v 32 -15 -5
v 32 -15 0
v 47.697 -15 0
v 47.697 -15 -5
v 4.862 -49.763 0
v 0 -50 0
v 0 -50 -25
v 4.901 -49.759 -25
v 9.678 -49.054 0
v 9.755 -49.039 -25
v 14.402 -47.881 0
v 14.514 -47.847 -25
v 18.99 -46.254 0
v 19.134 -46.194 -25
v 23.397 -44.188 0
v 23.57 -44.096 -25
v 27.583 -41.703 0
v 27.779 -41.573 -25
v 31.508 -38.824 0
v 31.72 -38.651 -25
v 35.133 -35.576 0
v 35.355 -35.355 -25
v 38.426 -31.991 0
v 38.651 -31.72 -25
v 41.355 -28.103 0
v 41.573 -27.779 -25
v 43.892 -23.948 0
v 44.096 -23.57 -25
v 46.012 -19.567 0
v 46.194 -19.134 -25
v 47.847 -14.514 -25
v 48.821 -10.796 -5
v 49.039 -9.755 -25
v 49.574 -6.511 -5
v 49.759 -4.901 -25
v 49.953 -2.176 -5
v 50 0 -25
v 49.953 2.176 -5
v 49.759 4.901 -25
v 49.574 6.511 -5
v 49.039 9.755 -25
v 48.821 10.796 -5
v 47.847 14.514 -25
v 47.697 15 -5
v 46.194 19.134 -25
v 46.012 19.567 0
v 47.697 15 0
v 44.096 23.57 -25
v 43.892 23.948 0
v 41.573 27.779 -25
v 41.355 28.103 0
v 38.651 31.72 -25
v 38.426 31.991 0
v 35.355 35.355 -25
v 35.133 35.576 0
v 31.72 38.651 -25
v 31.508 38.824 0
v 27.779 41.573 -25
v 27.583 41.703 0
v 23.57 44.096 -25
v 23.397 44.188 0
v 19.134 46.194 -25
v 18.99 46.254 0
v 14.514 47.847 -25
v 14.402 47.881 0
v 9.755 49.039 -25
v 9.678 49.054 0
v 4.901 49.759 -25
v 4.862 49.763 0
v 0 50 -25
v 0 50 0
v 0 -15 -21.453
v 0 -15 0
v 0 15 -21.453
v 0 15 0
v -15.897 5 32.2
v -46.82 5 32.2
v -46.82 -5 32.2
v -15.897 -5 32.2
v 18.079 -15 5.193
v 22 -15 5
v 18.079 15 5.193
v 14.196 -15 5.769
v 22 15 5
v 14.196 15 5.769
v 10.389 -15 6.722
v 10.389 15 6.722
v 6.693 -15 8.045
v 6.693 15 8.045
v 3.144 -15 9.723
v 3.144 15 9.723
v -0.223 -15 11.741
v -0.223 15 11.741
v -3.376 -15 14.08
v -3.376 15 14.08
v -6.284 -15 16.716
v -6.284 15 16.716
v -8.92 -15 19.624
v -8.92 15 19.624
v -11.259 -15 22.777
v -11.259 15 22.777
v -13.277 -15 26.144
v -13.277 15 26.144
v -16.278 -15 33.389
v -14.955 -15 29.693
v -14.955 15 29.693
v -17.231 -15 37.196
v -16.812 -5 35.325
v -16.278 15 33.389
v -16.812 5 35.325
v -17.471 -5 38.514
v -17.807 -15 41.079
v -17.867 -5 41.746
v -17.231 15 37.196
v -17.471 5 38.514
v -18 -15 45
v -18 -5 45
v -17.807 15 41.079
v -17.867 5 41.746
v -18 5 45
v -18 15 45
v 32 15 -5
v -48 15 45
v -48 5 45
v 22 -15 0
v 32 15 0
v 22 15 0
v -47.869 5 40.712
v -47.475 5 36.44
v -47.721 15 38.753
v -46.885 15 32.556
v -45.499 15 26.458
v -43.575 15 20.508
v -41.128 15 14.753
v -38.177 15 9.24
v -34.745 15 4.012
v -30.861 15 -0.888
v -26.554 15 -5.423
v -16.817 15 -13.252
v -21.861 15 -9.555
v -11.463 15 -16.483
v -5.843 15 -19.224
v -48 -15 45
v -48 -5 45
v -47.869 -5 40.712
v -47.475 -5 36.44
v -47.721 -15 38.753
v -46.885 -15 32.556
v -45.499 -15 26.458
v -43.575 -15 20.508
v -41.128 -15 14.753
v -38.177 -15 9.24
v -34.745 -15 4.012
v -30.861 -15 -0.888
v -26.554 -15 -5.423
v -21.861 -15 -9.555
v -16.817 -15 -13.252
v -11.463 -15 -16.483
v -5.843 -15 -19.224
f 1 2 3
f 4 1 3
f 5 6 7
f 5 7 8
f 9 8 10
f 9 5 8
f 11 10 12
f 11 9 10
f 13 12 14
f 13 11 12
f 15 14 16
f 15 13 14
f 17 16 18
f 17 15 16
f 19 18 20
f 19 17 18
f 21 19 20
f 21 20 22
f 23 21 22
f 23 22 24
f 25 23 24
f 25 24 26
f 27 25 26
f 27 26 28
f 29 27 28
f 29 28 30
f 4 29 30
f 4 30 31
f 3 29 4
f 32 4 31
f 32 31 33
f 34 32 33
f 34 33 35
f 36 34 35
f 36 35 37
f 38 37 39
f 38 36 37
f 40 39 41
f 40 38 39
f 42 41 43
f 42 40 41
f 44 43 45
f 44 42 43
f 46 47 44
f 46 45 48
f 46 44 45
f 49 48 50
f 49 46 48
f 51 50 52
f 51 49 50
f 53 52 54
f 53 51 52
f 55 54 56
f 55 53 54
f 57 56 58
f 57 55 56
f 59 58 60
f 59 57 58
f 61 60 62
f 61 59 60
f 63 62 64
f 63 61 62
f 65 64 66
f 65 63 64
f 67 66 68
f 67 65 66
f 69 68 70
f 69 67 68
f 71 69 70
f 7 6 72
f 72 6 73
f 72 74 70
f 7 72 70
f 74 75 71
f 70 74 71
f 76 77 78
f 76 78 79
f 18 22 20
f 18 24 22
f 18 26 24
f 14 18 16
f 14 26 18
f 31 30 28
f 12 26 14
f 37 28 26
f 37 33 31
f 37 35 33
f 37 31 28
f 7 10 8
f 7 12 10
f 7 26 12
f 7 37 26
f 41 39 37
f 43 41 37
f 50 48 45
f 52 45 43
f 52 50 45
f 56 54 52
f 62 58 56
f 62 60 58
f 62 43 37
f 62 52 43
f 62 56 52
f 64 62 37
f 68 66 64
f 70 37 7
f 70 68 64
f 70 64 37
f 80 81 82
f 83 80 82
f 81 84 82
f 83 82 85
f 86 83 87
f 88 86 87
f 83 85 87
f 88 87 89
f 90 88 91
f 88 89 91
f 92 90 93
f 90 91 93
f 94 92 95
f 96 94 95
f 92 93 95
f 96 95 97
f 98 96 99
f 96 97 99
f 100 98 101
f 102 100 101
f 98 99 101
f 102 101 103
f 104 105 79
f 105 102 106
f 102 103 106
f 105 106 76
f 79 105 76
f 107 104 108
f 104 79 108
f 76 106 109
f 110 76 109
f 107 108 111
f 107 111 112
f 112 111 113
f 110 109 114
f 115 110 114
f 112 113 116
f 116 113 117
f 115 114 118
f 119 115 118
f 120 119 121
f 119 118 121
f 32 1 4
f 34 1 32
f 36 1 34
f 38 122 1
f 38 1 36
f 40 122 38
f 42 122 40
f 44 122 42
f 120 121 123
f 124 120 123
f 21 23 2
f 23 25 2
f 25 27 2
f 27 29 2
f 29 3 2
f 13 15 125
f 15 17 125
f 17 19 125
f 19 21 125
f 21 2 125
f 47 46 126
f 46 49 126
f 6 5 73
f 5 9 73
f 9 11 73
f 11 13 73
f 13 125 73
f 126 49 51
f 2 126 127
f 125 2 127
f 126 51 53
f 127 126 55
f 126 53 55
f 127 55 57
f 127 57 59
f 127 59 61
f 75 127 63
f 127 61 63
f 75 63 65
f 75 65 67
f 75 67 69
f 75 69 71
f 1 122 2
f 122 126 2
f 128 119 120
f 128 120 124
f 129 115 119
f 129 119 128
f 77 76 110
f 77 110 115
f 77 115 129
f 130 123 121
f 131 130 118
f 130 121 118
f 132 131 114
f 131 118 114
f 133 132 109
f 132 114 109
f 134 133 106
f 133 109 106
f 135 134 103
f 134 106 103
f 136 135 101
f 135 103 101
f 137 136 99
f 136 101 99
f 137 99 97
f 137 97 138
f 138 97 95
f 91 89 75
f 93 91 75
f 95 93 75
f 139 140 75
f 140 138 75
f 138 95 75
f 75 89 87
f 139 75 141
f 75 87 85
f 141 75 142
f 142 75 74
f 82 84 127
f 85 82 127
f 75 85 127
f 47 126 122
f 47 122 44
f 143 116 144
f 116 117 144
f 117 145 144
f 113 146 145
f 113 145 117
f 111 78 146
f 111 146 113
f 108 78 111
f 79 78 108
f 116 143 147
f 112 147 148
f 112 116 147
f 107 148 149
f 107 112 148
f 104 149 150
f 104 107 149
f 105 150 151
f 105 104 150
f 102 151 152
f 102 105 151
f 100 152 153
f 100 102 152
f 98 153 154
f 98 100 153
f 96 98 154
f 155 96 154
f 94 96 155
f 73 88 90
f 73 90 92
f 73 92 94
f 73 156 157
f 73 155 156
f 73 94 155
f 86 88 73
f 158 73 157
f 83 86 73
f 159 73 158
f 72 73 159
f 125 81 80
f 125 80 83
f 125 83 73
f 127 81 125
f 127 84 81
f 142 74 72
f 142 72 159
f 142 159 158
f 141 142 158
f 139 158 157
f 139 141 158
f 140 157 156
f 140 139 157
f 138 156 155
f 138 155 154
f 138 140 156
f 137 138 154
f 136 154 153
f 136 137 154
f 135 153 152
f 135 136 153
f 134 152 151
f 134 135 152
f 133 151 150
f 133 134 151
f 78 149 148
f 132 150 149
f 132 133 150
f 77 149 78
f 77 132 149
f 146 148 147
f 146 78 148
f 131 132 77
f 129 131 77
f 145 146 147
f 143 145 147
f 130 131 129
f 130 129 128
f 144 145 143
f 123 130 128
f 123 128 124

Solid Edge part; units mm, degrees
sketch "Sketch1" plane through (0, 0, 0) normal (0, 0, 1) x (1, 0, 0)
  line L0 (0, 0) -> (0, 50)
  arc A0 (0, -50) -> (0, 50) centre (0, 0) ccw
  line L1 (0, 0) -> (0, -50)
extrude "Protrusion1" add sketch "Sketch1" against normal blind 25
sketch "Sketch2" plane through (25, 0, 0) normal (0, 0, 1) x (0, 1, 0)
  line L0 (-15, -7) -> (-15, -25)
  line L1 (-15, -25) -> (15, -25)
  line L2 (15, -7) -> (15, -25)
  line L3 (0, -7) -> (15, -7)
  line L4 (0, -7) -> (-15, -7)
extrude "ExtrudedCutout_1" cut sketch "Sketch2" against normal blind 5
sketch "Sketch3" plane through (0, 0, 0) normal (0, -1, 0) x (1, 0, 0)
  line L0 (-18, 45) -> (-48, 45)
  line L1 (22, 5) -> (22, -25)
  arc A0 (22, -25) -> (-48, 45) centre (22, 45) cw
  arc A1 (22, 5) -> (-18, 45) centre (22, 45) cw
extrude "ExtrudedProtrusion_3" add sketch "Sketch3" along normal mid plane 30
sketch "Sketch4" plane through (-33, 0, 45) normal (0, 0, 1) x (0, 1, 0)
  line L0 (5, -30) -> (5, 30)
  line L1 (5, 30) -> (-5, 30)
  line L2 (-5, 30) -> (-5, -30)
  line L3 (-5, -30) -> (5, -30)
extrude "ExtrudedCutout_2" cut sketch "Sketch4" along normal mid plane 25.6
